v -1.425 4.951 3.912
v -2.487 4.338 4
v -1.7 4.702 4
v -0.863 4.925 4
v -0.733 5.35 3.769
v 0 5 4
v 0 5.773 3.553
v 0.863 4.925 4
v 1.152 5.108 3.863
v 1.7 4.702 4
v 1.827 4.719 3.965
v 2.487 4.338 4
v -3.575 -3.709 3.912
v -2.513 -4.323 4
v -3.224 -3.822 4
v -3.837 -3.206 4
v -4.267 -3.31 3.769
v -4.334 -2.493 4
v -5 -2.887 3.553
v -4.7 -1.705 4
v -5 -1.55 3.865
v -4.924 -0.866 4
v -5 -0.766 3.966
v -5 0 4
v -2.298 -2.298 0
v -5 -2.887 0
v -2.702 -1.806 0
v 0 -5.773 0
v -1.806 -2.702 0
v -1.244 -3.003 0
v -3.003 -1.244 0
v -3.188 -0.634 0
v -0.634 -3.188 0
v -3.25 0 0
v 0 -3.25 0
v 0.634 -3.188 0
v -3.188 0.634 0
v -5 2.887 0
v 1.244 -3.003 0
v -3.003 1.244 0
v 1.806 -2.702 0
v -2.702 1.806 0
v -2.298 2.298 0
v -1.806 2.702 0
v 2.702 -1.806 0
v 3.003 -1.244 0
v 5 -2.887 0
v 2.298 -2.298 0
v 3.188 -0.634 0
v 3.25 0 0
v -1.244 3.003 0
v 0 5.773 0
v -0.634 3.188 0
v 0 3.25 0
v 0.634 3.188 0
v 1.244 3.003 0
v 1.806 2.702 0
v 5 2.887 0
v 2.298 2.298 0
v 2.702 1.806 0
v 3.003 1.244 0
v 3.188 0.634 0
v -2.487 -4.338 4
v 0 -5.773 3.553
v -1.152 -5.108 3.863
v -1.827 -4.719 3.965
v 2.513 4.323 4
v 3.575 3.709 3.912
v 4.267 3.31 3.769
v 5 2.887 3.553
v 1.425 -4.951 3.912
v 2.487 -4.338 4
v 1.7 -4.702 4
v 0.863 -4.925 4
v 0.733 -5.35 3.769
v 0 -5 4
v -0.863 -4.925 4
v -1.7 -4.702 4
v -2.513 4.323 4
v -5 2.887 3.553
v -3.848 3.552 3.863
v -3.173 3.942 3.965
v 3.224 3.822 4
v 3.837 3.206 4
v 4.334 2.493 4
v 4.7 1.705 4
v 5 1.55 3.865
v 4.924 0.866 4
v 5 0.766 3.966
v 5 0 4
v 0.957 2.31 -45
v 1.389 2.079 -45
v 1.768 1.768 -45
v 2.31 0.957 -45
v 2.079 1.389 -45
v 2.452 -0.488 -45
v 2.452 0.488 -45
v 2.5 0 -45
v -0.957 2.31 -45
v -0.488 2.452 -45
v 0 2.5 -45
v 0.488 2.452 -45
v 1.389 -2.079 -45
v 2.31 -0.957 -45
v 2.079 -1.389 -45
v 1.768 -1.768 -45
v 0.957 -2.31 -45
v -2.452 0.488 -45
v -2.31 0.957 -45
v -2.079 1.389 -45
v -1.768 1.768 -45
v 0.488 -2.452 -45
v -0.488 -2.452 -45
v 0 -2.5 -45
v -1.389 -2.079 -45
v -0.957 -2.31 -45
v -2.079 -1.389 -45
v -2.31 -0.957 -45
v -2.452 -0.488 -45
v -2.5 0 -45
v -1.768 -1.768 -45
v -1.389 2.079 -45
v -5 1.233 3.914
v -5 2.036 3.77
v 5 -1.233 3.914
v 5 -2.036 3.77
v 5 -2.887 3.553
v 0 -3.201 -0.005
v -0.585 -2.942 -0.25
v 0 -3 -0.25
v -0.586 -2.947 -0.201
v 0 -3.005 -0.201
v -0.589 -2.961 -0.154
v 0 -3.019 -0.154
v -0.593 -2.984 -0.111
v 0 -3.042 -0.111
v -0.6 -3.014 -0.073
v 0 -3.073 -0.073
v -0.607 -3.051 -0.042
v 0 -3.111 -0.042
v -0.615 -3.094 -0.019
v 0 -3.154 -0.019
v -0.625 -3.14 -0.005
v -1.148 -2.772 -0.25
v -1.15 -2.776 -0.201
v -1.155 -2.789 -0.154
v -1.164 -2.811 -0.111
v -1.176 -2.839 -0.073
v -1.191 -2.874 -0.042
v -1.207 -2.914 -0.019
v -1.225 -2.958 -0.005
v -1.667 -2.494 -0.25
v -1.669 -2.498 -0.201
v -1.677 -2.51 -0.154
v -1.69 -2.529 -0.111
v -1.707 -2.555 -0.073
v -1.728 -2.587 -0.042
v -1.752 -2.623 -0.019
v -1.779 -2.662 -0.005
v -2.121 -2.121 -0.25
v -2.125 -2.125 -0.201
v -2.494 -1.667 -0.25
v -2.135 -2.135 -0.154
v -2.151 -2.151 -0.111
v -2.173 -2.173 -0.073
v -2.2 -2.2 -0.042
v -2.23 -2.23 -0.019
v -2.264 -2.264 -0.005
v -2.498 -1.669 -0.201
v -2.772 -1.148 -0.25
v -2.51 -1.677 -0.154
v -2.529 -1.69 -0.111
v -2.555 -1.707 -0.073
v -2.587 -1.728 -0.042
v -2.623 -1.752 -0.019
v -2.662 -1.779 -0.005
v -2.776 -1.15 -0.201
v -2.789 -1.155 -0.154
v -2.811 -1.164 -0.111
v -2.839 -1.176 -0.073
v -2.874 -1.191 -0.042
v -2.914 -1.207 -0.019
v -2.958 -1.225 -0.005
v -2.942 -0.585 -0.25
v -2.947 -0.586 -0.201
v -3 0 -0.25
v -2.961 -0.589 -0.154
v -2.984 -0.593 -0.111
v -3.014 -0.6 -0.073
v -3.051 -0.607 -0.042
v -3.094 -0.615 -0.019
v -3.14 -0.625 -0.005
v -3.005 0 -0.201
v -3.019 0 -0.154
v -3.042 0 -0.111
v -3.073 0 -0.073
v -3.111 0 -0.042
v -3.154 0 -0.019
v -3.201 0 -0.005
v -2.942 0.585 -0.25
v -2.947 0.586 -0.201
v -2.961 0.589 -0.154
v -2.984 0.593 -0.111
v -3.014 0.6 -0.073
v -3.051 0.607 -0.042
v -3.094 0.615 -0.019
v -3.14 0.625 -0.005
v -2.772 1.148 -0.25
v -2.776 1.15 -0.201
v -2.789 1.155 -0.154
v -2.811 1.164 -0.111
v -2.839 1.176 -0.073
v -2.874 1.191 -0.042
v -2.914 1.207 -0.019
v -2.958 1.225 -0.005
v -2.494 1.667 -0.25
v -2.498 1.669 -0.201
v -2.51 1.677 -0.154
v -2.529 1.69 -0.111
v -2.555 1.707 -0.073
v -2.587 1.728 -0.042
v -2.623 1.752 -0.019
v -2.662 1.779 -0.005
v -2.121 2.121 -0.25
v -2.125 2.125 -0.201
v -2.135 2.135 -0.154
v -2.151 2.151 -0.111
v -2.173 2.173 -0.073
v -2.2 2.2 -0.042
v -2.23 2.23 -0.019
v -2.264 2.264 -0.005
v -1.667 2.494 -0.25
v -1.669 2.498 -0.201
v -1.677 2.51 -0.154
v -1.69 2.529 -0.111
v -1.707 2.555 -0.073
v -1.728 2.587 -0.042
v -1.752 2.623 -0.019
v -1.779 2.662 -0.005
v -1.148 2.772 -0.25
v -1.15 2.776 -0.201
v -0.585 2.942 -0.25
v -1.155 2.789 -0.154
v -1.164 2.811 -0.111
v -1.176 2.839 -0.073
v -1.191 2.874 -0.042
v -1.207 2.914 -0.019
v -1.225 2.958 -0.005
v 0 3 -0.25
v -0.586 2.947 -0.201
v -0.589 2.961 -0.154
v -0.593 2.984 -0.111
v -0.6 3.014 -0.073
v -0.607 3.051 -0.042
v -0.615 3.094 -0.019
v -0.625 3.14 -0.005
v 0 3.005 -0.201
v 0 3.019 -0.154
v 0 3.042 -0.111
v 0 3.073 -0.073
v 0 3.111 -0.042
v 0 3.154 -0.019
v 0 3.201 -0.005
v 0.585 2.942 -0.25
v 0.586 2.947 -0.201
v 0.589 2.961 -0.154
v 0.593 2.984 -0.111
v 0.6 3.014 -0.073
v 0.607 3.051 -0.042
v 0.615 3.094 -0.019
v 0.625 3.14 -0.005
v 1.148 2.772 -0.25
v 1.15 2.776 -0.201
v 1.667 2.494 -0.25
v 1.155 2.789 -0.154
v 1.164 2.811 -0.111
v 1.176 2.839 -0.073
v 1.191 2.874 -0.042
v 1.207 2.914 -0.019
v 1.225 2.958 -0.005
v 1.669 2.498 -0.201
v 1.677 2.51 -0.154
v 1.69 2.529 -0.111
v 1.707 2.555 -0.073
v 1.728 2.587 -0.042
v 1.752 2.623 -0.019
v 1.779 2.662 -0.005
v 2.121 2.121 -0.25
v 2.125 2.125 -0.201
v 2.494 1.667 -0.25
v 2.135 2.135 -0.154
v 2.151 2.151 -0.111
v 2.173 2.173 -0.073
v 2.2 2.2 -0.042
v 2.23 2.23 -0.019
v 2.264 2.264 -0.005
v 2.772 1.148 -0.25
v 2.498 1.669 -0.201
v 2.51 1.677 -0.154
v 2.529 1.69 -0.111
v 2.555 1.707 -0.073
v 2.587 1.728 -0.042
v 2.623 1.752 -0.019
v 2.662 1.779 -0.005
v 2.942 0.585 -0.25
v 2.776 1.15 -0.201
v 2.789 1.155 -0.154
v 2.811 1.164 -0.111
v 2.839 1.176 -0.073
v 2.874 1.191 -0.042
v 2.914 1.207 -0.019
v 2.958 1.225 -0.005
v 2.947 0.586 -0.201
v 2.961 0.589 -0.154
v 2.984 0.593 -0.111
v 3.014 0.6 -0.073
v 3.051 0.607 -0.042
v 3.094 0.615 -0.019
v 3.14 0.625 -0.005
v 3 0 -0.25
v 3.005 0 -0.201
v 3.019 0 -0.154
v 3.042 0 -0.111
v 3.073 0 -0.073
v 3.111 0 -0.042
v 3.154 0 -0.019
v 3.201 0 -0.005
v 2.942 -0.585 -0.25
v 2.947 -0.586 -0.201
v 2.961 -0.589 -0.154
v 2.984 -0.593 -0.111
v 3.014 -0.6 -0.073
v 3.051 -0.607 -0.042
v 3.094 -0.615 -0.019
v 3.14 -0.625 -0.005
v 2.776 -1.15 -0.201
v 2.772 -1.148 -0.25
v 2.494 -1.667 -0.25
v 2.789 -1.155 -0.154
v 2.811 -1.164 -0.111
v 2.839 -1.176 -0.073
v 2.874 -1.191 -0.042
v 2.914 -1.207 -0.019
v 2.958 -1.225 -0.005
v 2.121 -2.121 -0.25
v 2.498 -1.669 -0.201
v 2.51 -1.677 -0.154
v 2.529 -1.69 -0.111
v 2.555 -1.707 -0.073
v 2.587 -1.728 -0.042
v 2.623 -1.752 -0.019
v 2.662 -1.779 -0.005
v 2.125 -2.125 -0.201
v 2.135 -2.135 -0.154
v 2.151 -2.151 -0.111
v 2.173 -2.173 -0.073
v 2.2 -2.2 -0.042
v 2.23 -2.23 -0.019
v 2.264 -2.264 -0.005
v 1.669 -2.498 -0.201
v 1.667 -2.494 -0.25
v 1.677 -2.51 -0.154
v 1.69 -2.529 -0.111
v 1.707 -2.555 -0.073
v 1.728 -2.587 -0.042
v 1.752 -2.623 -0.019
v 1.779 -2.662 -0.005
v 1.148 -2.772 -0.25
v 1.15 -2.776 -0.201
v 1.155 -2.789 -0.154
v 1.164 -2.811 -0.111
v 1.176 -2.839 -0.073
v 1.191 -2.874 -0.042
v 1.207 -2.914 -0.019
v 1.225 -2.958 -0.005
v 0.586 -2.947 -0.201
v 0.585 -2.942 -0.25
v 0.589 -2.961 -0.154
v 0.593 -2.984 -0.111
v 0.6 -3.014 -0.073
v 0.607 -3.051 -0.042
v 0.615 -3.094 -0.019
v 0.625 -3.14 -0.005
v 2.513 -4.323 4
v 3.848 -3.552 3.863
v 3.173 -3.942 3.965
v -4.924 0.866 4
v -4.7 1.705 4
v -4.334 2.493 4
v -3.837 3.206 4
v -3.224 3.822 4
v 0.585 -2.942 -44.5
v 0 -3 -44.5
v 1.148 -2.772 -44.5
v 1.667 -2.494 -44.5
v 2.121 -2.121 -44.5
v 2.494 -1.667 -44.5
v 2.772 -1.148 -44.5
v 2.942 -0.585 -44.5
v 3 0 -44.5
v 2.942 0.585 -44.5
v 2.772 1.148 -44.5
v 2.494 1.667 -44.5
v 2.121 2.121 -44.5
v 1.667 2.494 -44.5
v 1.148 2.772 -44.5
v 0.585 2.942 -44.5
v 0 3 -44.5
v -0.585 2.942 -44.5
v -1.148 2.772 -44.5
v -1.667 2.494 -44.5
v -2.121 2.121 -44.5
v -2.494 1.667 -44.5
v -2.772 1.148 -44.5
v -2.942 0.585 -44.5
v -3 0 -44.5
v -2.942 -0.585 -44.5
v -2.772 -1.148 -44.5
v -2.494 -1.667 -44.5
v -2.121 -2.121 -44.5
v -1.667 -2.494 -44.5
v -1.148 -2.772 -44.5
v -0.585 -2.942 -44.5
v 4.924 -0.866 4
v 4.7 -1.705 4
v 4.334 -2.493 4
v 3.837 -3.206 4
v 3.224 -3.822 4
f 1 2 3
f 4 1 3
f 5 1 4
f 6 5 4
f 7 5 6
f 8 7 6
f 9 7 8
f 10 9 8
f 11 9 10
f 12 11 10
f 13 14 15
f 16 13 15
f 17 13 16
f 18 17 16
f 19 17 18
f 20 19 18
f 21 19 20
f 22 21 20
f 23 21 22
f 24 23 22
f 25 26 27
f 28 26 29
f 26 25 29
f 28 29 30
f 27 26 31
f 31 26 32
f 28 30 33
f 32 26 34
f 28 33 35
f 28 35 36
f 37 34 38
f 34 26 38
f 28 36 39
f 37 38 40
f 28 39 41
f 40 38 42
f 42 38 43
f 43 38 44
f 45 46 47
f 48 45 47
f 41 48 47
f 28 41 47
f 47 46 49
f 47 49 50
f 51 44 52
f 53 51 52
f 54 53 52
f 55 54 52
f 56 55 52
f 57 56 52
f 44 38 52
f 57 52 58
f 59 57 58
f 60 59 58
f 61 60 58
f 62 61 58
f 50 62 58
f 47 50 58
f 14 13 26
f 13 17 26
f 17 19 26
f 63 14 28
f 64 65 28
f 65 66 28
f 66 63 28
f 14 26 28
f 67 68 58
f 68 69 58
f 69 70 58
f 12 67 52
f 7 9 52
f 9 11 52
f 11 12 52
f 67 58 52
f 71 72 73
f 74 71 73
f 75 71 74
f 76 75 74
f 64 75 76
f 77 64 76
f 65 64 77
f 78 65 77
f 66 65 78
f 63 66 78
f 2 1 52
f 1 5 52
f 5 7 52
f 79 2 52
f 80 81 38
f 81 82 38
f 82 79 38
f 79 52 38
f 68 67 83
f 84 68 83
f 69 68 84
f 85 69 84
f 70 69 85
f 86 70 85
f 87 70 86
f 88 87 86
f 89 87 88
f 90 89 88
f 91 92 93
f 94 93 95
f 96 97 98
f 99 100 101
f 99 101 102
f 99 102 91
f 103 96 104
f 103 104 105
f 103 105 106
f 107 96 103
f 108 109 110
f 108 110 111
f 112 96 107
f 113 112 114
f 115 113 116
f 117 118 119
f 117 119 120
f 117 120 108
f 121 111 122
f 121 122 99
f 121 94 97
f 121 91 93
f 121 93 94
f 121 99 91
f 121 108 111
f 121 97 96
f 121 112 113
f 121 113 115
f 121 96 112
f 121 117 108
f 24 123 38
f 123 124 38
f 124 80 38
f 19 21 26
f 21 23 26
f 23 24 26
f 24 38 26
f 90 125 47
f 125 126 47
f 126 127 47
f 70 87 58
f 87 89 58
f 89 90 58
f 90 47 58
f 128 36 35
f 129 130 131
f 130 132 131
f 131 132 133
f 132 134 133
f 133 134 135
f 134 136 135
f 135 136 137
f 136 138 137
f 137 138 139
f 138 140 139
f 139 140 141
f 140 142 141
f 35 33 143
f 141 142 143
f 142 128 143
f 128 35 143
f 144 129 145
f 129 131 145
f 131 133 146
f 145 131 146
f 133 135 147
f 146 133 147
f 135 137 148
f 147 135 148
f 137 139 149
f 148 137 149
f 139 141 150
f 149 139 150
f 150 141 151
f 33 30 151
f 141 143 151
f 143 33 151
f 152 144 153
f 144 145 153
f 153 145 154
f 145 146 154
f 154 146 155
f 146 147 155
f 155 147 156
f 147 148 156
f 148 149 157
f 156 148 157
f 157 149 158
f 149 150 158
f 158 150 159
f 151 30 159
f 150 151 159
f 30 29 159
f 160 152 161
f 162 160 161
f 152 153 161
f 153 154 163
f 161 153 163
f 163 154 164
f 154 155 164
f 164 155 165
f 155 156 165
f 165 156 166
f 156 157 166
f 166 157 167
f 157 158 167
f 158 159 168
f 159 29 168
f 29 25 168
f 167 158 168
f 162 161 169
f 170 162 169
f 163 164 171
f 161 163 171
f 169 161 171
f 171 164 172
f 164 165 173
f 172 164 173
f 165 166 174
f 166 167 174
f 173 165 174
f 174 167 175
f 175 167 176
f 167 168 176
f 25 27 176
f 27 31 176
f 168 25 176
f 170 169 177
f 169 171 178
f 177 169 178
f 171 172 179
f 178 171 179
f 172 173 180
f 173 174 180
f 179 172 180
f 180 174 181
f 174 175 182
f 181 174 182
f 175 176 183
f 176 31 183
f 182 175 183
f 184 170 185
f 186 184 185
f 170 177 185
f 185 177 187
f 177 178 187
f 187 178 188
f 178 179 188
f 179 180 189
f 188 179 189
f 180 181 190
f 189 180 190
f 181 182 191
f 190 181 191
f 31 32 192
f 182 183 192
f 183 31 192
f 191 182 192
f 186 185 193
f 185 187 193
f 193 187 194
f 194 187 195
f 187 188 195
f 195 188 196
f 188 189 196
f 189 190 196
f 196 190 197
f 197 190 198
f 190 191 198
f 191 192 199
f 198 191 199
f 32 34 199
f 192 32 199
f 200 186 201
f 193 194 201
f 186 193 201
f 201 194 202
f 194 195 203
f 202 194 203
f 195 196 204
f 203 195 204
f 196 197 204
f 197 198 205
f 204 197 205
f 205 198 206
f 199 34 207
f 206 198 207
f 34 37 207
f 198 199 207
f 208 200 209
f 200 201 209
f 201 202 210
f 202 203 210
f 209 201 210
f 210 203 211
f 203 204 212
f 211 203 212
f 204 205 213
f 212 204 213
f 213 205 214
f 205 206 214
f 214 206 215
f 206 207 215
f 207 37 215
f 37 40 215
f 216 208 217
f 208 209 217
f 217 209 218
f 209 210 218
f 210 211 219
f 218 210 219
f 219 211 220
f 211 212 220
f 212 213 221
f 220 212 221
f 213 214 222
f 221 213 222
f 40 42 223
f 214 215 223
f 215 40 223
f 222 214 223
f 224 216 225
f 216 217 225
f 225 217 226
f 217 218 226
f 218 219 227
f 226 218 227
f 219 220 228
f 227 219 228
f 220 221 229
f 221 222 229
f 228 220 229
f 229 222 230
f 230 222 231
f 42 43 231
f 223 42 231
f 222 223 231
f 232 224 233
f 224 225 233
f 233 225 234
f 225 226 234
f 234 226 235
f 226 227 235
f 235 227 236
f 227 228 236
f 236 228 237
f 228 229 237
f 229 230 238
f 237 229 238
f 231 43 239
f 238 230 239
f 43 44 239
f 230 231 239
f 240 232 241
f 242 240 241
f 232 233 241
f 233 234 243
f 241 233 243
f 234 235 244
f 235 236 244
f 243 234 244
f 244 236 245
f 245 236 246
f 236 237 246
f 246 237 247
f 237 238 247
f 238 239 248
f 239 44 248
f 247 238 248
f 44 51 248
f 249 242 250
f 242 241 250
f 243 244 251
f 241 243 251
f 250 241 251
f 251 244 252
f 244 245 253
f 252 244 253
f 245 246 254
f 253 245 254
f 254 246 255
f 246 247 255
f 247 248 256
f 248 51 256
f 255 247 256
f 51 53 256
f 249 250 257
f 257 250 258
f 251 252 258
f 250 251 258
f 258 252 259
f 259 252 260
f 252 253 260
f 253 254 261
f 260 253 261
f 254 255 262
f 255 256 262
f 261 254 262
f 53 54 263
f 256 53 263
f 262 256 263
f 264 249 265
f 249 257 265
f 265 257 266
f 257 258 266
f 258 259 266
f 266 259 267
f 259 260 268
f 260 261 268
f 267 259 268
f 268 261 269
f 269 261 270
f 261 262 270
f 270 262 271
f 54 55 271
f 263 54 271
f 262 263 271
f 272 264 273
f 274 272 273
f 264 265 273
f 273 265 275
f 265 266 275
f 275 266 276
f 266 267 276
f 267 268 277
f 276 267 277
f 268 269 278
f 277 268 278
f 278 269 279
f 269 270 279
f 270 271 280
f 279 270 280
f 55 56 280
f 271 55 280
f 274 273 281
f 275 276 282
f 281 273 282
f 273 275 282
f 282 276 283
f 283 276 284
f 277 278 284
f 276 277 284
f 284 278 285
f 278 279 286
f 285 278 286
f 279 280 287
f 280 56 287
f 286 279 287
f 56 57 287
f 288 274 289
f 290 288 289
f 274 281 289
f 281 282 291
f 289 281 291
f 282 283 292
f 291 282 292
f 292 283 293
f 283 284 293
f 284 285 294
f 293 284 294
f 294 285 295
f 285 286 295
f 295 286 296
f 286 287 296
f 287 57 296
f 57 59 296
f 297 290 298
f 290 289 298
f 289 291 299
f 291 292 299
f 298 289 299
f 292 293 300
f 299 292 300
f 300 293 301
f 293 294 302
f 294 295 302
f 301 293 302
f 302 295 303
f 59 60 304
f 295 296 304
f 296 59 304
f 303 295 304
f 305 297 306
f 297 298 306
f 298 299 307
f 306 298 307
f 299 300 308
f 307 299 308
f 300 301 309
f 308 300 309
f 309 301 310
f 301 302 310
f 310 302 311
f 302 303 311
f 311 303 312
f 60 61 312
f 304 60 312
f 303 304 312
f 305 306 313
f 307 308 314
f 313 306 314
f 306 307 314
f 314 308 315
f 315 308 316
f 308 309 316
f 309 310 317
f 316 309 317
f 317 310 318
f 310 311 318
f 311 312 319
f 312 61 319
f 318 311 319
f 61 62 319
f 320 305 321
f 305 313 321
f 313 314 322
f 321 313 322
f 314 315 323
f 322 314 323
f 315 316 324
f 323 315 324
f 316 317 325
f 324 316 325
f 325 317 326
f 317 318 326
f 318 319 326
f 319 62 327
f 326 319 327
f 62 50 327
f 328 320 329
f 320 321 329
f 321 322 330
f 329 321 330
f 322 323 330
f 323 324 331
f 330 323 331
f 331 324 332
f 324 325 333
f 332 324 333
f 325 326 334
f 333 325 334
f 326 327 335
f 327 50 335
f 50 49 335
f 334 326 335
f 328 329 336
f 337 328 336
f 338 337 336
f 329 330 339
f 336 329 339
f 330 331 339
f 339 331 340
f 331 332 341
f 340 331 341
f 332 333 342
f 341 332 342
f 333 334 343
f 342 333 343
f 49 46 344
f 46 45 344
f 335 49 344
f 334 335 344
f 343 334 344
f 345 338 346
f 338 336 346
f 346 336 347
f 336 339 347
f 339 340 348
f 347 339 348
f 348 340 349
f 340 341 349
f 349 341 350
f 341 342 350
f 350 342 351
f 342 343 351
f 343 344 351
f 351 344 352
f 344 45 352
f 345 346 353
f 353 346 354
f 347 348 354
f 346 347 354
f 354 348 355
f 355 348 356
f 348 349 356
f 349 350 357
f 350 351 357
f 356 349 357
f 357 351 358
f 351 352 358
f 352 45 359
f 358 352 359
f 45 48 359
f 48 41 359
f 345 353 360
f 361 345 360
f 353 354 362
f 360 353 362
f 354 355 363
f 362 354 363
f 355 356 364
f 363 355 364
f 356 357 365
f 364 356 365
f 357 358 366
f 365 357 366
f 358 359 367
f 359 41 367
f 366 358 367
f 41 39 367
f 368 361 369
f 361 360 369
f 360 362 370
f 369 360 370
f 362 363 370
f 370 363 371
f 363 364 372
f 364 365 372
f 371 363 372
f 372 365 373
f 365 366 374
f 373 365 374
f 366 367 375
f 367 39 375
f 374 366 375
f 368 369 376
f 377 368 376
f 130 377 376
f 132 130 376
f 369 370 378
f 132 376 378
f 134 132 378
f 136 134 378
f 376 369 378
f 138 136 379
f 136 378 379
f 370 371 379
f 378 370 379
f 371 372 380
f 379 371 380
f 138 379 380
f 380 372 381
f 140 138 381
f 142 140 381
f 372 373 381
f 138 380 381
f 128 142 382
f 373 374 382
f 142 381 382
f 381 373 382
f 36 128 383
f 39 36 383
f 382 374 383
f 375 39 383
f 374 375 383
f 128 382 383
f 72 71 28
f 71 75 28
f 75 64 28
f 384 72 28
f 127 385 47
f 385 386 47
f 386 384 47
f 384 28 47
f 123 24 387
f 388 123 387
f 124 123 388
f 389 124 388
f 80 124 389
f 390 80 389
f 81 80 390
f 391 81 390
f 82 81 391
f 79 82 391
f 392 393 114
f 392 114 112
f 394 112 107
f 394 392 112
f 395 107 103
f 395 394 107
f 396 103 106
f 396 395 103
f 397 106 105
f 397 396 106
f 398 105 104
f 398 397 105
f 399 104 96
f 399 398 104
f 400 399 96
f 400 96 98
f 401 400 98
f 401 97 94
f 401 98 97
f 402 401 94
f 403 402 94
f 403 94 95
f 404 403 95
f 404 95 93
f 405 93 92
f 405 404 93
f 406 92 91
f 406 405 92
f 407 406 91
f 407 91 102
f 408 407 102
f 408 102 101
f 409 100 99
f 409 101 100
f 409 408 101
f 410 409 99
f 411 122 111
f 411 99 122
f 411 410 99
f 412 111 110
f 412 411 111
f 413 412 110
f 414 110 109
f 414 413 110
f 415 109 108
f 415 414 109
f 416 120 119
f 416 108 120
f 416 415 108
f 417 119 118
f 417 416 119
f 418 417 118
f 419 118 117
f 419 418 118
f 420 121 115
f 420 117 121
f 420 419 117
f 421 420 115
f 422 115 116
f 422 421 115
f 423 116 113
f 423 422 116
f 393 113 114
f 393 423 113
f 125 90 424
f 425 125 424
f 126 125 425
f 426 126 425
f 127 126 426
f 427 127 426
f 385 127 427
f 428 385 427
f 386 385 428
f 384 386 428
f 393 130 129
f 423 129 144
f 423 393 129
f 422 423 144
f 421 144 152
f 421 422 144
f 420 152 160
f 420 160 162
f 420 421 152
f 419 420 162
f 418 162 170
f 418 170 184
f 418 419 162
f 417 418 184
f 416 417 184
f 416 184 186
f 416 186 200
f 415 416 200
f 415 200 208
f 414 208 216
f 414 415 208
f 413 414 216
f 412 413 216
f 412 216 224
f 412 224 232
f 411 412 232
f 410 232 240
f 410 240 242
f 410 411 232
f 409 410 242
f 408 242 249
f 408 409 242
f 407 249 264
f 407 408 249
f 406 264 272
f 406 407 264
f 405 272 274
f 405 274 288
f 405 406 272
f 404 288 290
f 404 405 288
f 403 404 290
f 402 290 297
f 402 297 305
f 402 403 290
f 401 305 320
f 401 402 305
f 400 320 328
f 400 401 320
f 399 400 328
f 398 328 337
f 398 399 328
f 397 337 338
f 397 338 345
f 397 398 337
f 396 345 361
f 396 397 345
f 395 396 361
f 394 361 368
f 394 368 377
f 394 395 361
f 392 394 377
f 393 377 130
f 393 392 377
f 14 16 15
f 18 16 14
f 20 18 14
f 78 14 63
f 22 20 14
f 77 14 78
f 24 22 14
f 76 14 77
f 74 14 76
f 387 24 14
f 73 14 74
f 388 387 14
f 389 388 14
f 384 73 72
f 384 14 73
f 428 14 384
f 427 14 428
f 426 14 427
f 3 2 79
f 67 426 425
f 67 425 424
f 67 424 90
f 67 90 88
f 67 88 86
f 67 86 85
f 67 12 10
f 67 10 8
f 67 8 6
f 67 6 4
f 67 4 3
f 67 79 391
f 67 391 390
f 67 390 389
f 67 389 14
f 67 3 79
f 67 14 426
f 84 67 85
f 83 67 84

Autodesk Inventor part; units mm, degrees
ref_plane "WorkPlane1" through (0, 0, 0) normal (0, 0, 1) x (1, 0, 0)
sketch "Sketch1" plane through (0, 0, 0) normal (0, 0, 1) x (1, 0, 0)
  point P0 (0, 0)
sketch "Sketch2" plane through (0, 0, 0) normal (0, 0, 1) x (1, 0, 0)
  line L0 (-5, 2.8868) -> (-5, -2.8868)
  line L1 (0, 5.7734) -> (-5, 2.8868)
  line L2 (5, 2.8868) -> (0, 5.7734)
  line L3 (5, -2.8868) -> (5, 2.8868)
  line L4 (0, -5.7734) -> (5, -2.8868)
  line L5 (-5, -2.8868) -> (0, -5.7734)
  circle A0 centre (0, 0) radius 5 construction
  dimension "d1" = 10
  dimension "d29" = 0
  dimension "d30" = 0
extrude "Extrusion1" add sketch "Sketch2" along normal blind 4
sketch "Sketch3" plane through (0, 0, 0) normal (1, 0, 0) x (0, 1, 0)
  line L0 (5, 4) -> (5.8734, 4)
  line L1 (5.8734, 3.4957) -> (5, 4)
  line L2 (5.8734, 4) -> (5.8734, 3.4957)
  line L3 (0, -0.8) -> (0, 4.8) projected
  line L4 (5.7734, 0) -> (5.7734, 4) projected
  dimension "d25" = 0.1
  dimension "d26" = 0
  dimension "d27" = 60
  dimension "d28" = 5
revolve "Revolution1" cut sketch "Sketch3" angle 360 about axis through (0, 0, -10) along (0, 0, 1)
sketch "Sketch4" plane through (0, 0, 0) normal (1, 0, 0) x (0, 1, 0)
  line L0 (0, -45) -> (0, 0)
  line L1 (-3, -45) -> (0, -45)
  line L2 (-3, 0) -> (-3, -45)
  line L3 (0, 0) -> (-3, 0)
  line L4 (0, -45) -> (0, 0)
  line L5 (-3.6, 0) -> (0.6, 0) projected
  line L6 (0, -54) -> (0, 9) projected
  dimension "d18" = 3
  dimension "d20" = 45
  dimension "d33" = 0
  dimension "d34" = 0
revolve "Revolution2" add sketch "Sketch4" angle 360 about axis through (0, 0, -45) along (0, 0, -1)
chamfer "Chamfer1" distance 0.5 angle 45 1 edges at (0, 3, -45)
fillet "Fillet1" radius 0.25 1 edges at (0, 3, 0)
thread "Thread1" size "M6x1" class "6g" standard "ISO Metric profile" length 18
ref_plane "MSC_PF1" through (0, 0, 0) normal (1, 0, 0) x (0, 1, 0)
ref_plane "MSC_PT1" through (0, 0, 0) normal (0, 0, -1) x (-1, 0, 0)
equation "\"d22\" = 0.5 * PTC"
equation "\"d23\" = 0.5 * PTC"
equation "\"d24\" = r"
equation "\"d1\" = ParS"
equation "\"d6\" = ParK"
equation "\"d28\" = 0.5 * ParS"
equation "\"d18\" = 0.5 * NND"
equation "\"d20\" = NLG"
equation "\"NND\" = 6"
equation "\"NLG\" = 45"
equation "\"PTC\" = 1"
equation "\"ParK\" = 4"
equation "\"ParS\" = 10"
equation "\"msp_es\" = 0.577367 * ParS"
equation "\"r\" = 0.25"
equation "\"THREADDIA\" = NND"
properties part number "ISO 4016 - M6 x 45" material "Steel"
